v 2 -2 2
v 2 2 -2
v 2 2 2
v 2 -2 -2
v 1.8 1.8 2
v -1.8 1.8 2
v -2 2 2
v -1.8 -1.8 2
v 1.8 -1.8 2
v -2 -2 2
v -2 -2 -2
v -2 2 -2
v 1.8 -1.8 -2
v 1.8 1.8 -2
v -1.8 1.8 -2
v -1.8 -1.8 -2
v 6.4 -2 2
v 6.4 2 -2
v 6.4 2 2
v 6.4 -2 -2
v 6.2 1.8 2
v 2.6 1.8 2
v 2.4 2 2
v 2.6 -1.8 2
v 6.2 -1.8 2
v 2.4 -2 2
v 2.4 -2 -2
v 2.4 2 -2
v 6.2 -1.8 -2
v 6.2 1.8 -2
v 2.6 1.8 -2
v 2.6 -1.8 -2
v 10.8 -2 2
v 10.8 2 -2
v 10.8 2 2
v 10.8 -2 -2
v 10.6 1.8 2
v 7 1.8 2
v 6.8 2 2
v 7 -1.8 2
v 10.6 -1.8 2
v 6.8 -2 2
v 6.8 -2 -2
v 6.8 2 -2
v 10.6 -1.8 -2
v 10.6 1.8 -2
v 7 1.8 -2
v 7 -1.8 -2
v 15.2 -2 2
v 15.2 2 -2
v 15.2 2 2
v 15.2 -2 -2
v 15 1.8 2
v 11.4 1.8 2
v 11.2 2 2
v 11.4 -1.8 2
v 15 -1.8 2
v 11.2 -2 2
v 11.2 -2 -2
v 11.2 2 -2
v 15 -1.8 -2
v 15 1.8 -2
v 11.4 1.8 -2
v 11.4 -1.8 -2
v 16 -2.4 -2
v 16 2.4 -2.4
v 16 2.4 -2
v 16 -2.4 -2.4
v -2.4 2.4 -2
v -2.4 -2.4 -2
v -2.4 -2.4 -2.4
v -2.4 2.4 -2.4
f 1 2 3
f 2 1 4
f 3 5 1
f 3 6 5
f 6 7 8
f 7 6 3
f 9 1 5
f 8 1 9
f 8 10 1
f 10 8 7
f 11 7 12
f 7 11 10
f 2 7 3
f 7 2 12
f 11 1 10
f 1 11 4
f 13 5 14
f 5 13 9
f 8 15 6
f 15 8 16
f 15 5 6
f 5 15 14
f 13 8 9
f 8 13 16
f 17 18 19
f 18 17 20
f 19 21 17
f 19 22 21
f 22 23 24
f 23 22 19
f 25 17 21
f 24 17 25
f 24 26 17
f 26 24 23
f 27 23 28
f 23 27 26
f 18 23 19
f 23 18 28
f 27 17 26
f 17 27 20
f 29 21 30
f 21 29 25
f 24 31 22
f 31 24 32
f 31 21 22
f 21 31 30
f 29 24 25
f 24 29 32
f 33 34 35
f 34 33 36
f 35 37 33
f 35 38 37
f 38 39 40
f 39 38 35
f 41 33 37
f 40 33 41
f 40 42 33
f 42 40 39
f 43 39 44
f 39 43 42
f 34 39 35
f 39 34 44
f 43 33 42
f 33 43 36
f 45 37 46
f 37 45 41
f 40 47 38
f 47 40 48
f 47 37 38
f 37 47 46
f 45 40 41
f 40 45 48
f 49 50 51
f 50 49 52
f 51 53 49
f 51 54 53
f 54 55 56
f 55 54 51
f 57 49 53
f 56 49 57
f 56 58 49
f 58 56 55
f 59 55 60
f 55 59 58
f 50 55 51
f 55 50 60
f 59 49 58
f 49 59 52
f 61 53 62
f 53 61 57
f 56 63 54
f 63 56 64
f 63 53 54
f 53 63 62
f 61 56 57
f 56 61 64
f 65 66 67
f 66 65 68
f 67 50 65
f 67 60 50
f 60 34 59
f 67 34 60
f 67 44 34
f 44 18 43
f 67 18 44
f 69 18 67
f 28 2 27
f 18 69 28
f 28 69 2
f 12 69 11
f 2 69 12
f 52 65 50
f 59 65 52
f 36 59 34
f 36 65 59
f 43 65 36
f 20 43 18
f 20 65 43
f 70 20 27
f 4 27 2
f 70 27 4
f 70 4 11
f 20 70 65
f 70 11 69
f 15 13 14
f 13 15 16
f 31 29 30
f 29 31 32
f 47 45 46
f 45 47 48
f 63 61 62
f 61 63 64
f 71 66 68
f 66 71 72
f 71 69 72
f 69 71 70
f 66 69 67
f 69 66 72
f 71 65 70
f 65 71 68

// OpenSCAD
// file: boolean.scad
/*
	License: None
	This code is public domain

	Placed By: William A Adams
	31 Oct 2011
*/
// convenience for powers of 2 arithmetic
// Bits start counting from '0'
function bitval(pos) = pow(2,(pos)); 

// A quick check to see if a bit is set
// Does not work with negative numbers
function _BTEST(x, abit) = x % (abit+abit) >= abit; 
function BTEST(x, pos) = _BTEST(x, bitval(pos));

// Shift left by the specified number of positions
// Default is 1 postion.
// Equivalent to multiplying by 2
function LSHIFT(x, pos=1) = x*bitval(pos);

// Shift right by the specified number of positions
// Default is 1 position
// Equivalent to division by 2
function RSHIFT(x, pos=1) = floor(x/bitval(pos));

// Get the value of the lowest bit
// return as number '0' or '1'
function lowbit(x) = x-LSHIFT(RSHIFT(x));

// Get the value of a bit at a specific position
// return as number '0' or '1'
function BIT(x, pos=0) = lowbit(RSHIFT(x,pos));

// Invert the value of a bit
function BINV(a) = !a;

// Boolean Algebra
function BFALSE(a,b) = 0;
function BAND(a,b) = (a==1) && (b==1) ? 1 : 0;
function BA(a,b) = (a==1) ? 1 : 0;
function BB(a,b) = (b==1) ? 1 : 0;
function BXOR(a,b) = (a==b) ? 0 : 1;
function BOR(a,b) = (a==1) || (b==1) ? 1 : 0;
function BNOR(a,b) = (a==0) && (b==0);			// Peirce's arrow
function BXNOR(a,b) = a==b;
function BNOTB(a,b) = !b;
function BNOTA(a,b) = !a;
function BNAND(a, b) = (a==1) ? (b==1) ? 0 : 1 : 1;	// Sheffer stroke
function BTRUE(a,b) = 1;

// multi-bit operations
// a & b
function 32BITAND(a, b) = 
	LSHIFT(BAND(BIT(a,31), BIT(b,31)),31) +
	LSHIFT(BAND(BIT(a,30), BIT(b,30)),30) +
	LSHIFT(BAND(BIT(a,29), BIT(b,29)),29) +
	LSHIFT(BAND(BIT(a,28), BIT(b,28)),28) +
	LSHIFT(BAND(BIT(a,27), BIT(b,27)),27) +
	LSHIFT(BAND(BIT(a,26), BIT(b,26)),26) +
	LSHIFT(BAND(BIT(a,25), BIT(b,25)),25) +
	LSHIFT(BAND(BIT(a,24), BIT(b,24)),24)+
	LSHIFT(BAND(BIT(a,23), BIT(b,23)),23) +
	LSHIFT(BAND(BIT(a,22), BIT(b,22)),22) +
	LSHIFT(BAND(BIT(a,21), BIT(b,21)),21) +
	LSHIFT(BAND(BIT(a,20), BIT(b,20)),20) +
	LSHIFT(BAND(BIT(a,19), BIT(b,19)),19) +
	LSHIFT(BAND(BIT(a,18), BIT(b,18)),18) +
	LSHIFT(BAND(BIT(a,17), BIT(b,17)),17) +
	LSHIFT(BAND(BIT(a,16), BIT(b,16)),16)+
	LSHIFT(BAND(BIT(a,15), BIT(b,15)),15) +
	LSHIFT(BAND(BIT(a,14), BIT(b,14)),14) +
	LSHIFT(BAND(BIT(a,13), BIT(b,13)),13) +
	LSHIFT(BAND(BIT(a,12), BIT(b,12)),12) +
	LSHIFT(BAND(BIT(a,11), BIT(b,11)),11) +
	LSHIFT(BAND(BIT(a,10), BIT(b,10)),10) +
	LSHIFT(BAND(BIT(a,9), BIT(b,9)),9) +
	LSHIFT(BAND(BIT(a,8), BIT(b,8)),8)+
	LSHIFT(BAND(BIT(a,7), BIT(b,7)),7) +
	LSHIFT(BAND(BIT(a,6), BIT(b,6)),6) +
	LSHIFT(BAND(BIT(a,5), BIT(b,5)),5) +
	LSHIFT(BAND(BIT(a,4), BIT(b,4)),4) +
	LSHIFT(BAND(BIT(a,3), BIT(b,3)),3) +
	LSHIFT(BAND(BIT(a,2), BIT(b,2)),2) +
	LSHIFT(BAND(BIT(a,1), BIT(b,1)),1) +
	LSHIFT(BAND(BIT(a,0), BIT(b,0)),0);

// a & b
function 16BITAND(a, b) = 
	LSHIFT(BAND(BIT(a,15), BIT(b,15)),15) +
	LSHIFT(BAND(BIT(a,14), BIT(b,14)),14) +
	LSHIFT(BAND(BIT(a,13), BIT(b,13)),13) +
	LSHIFT(BAND(BIT(a,12), BIT(b,12)),12) +
	LSHIFT(BAND(BIT(a,11), BIT(b,11)),11) +
	LSHIFT(BAND(BIT(a,10), BIT(b,10)),10) +
	LSHIFT(BAND(BIT(a,9), BIT(b,9)),9) +
	LSHIFT(BAND(BIT(a,8), BIT(b,8)),8)+
	LSHIFT(BAND(BIT(a,7), BIT(b,7)),7) +
	LSHIFT(BAND(BIT(a,6), BIT(b,6)),6) +
	LSHIFT(BAND(BIT(a,5), BIT(b,5)),5) +
	LSHIFT(BAND(BIT(a,4), BIT(b,4)),4) +
	LSHIFT(BAND(BIT(a,3), BIT(b,3)),3) +
	LSHIFT(BAND(BIT(a,2), BIT(b,2)),2) +
	LSHIFT(BAND(BIT(a,1), BIT(b,1)),1) +
	LSHIFT(BAND(BIT(a,0), BIT(b,0)),0);

// a | b
function 32BITOR(a, b) = 
	LSHIFT(BOR(BIT(a,31), BIT(b,31)),31) +
	LSHIFT(BOR(BIT(a,30), BIT(b,30)),30) +
	LSHIFT(BOR(BIT(a,29), BIT(b,29)),29) +
	LSHIFT(BOR(BIT(a,28), BIT(b,28)),28) +
	LSHIFT(BOR(BIT(a,27), BIT(b,27)),27) +
	LSHIFT(BOR(BIT(a,26), BIT(b,26)),26) +
	LSHIFT(BOR(BIT(a,25), BIT(b,25)),25) +
	LSHIFT(BOR(BIT(a,24), BIT(b,24)),24)+
	LSHIFT(BOR(BIT(a,23), BIT(b,23)),23) +
	LSHIFT(BOR(BIT(a,22), BIT(b,22)),22) +
	LSHIFT(BOR(BIT(a,21), BIT(b,21)),21) +
	LSHIFT(BOR(BIT(a,20), BIT(b,20)),20) +
	LSHIFT(BOR(BIT(a,19), BIT(b,19)),19) +
	LSHIFT(BOR(BIT(a,18), BIT(b,18)),18) +
	LSHIFT(BOR(BIT(a,17), BIT(b,17)),17) +
	LSHIFT(BOR(BIT(a,16), BIT(b,16)),16)+
	LSHIFT(BOR(BIT(a,15), BIT(b,15)),15) +
	LSHIFT(BOR(BIT(a,14), BIT(b,14)),14) +
	LSHIFT(BOR(BIT(a,13), BIT(b,13)),13) +
	LSHIFT(BOR(BIT(a,12), BIT(b,12)),12) +
	LSHIFT(BOR(BIT(a,11), BIT(b,11)),11) +
	LSHIFT(BOR(BIT(a,10), BIT(b,10)),10) +
	LSHIFT(BOR(BIT(a,9), BIT(b,9)),9) +
	LSHIFT(BOR(BIT(a,8), BIT(b,8)),8)+
	LSHIFT(BOR(BIT(a,7), BIT(b,7)),7) +
	LSHIFT(BOR(BIT(a,6), BIT(b,6)),6) +
	LSHIFT(BOR(BIT(a,5), BIT(b,5)),5) +
	LSHIFT(BOR(BIT(a,4), BIT(b,4)),4) +
	LSHIFT(BOR(BIT(a,3), BIT(b,3)),3) +
	LSHIFT(BOR(BIT(a,2), BIT(b,2)),2) +
	LSHIFT(BOR(BIT(a,1), BIT(b,1)),1) +
	LSHIFT(BOR(BIT(a,0), BIT(b,0)),0);

// ~a
function 32BITNOT(a) = 
	LSHIFT(BINV(BIT(a,31)), 31) +
	LSHIFT(BINV(BIT(a,30)), 30) +
	LSHIFT(BINV(BIT(a,29)), 29) +
	LSHIFT(BINV(BIT(a,28)), 28) +
	LSHIFT(BINV(BIT(a,27)), 27) +
	LSHIFT(BINV(BIT(a,26)), 26) +
	LSHIFT(BINV(BIT(a,25)), 25) +
	LSHIFT(BINV(BIT(a,24)), 24) +
	LSHIFT(BINV(BIT(a,23)), 23) +
	LSHIFT(BINV(BIT(a,22)), 22) +
	LSHIFT(BINV(BIT(a,21)), 21) +
	LSHIFT(BINV(BIT(a,20)), 20) +
	LSHIFT(BINV(BIT(a,19)), 19) +
	LSHIFT(BINV(BIT(a,18)), 18) +
	LSHIFT(BINV(BIT(a,17)), 17) +
	LSHIFT(BINV(BIT(a,16)), 16) +
	LSHIFT(BINV(BIT(a,15)), 15) +
	LSHIFT(BINV(BIT(a,14)), 14) +
	LSHIFT(BINV(BIT(a,13)), 13) +
	LSHIFT(BINV(BIT(a,12)), 12) +
	LSHIFT(BINV(BIT(a,11)), 11) +
	LSHIFT(BINV(BIT(a,10)), 10) +
	LSHIFT(BINV(BIT(a,9)), 9) +
	LSHIFT(BINV(BIT(a,8)), 8) +
	LSHIFT(BINV(BIT(a,7)), 7) +
	LSHIFT(BINV(BIT(a,6)), 6) +
	LSHIFT(BINV(BIT(a,5)), 5) +
	LSHIFT(BINV(BIT(a,4)), 4) +
	LSHIFT(BINV(BIT(a,3)), 3) +
	LSHIFT(BINV(BIT(a,2)), 2) +
	LSHIFT(BINV(BIT(a,1)), 1) +
	LSHIFT(BINV(BIT(a,0)), 0) ;

// a ^ b
function 32BITXOR(a, b) = 
	LSHIFT(BXOR(BIT(a,31), BIT(b,31)),31) +
	LSHIFT(BXOR(BIT(a,30), BIT(b,30)),30) +
	LSHIFT(BXOR(BIT(a,29), BIT(b,29)),29) +
	LSHIFT(BXOR(BIT(a,28), BIT(b,28)),28) +
	LSHIFT(BXOR(BIT(a,27), BIT(b,27)),27) +
	LSHIFT(BXOR(BIT(a,26), BIT(b,26)),26) +
	LSHIFT(BXOR(BIT(a,25), BIT(b,25)),25) +
	LSHIFT(BXOR(BIT(a,24), BIT(b,24)),24)+
	LSHIFT(BXOR(BIT(a,23), BIT(b,23)),23) +
	LSHIFT(BXOR(BIT(a,22), BIT(b,22)),22) +
	LSHIFT(BXOR(BIT(a,21), BIT(b,21)),21) +
	LSHIFT(BXOR(BIT(a,20), BIT(b,20)),20) +
	LSHIFT(BXOR(BIT(a,19), BIT(b,19)),19) +
	LSHIFT(BXOR(BIT(a,18), BIT(b,18)),18) +
	LSHIFT(BXOR(BIT(a,17), BIT(b,17)),17) +
	LSHIFT(BXOR(BIT(a,16), BIT(b,16)),16)+
	LSHIFT(BXOR(BIT(a,15), BIT(b,15)),15) +
	LSHIFT(BXOR(BIT(a,14), BIT(b,14)),14) +
	LSHIFT(BXOR(BIT(a,13), BIT(b,13)),13) +
	LSHIFT(BXOR(BIT(a,12), BIT(b,12)),12) +
	LSHIFT(BXOR(BIT(a,11), BIT(b,11)),11) +
	LSHIFT(BXOR(BIT(a,10), BIT(b,10)),10) +
	LSHIFT(BXOR(BIT(a,9), BIT(b,9)),9) +
	LSHIFT(BXOR(BIT(a,8), BIT(b,8)),8)+
	LSHIFT(BXOR(BIT(a,7), BIT(b,7)),7) +
	LSHIFT(BXOR(BIT(a,6), BIT(b,6)),6) +
	LSHIFT(BXOR(BIT(a,5), BIT(b,5)),5) +
	LSHIFT(BXOR(BIT(a,4), BIT(b,4)),4) +
	LSHIFT(BXOR(BIT(a,3), BIT(b,3)),3) +
	LSHIFT(BXOR(BIT(a,2), BIT(b,2)),2) +
	LSHIFT(BXOR(BIT(a,1), BIT(b,1)),1) +
	LSHIFT(BXOR(BIT(a,0), BIT(b,0)),0);
// main file
/* 
License: None
This code is public domain

Placed By: William A Adams
31 Oct 2011
*/

include <boolean.scad>

joinfactor = 0.00001;

//display_1_8();

scale([4,4,4])
display_binary(number=0, bits=4, withplate=true);
//display_binary(number=1, bits=4, withplate=true);
//display_binary(number=2, bits=4, withplate=true);
//display_binary(number=4, bits=4, withplate=true);
//display_binary(number=5, bits=4, withplate=true);

//scale([4,4,8])
//display_binary(number = 1964, bits = 12, withplate=true);

//display_binary(number = 198, bits = 12, withplate=true);
//test_lowbit();
//test_BIT();

module display_1_8()
{
	scale([8,8,8])
	{
		for (number = [0:8])
		{
			translate([0, 1.2*number, 0])
			display_binary(number = number, bits = 4, withplate=true);
		
		}
	}
}

module display_binary(number, bits)
{
	side = 1;
	gap = 0.1;

	for (pos = [0:bits-1])
	{
		if (BTEST(number, bits-1-pos))
		{
			translate([pos*(side+gap), 0, 0])
			cube(size=[side, side, side], center=true);
		} else
		{
			translate([pos*(side+gap), 0, 0])
			{
				difference()
				{
					cube(size=[side, side, side], center=true);
					
					cube(size=[side-gap, side-gap,side+gap], center=true);
//					cube(size=[side-gap, side-gap,side-gap], center=true);
				}
			}
		}
	}

	if (withplate)
	{
		translate([-side/2-gap, -side/2-gap, -gap-(side/2)+joinfactor])
		cube(size = [(side+gap)*bits+gap*2, (side+gap*2), gap]);
	}
}

module test_lowbit()
{
	echo(lowbit(3));
	echo(lowbit(2));
	echo(lowbit(5));

	echo(lowbit(5));

	echo(lowbit(RSHIFT(5)));

	echo(lowbit(RSHIFT(RSHIFT(5))));
}

module test_BIT()
{
	echo(BIT(5,0));
	echo(BIT(5,1));
	echo(BIT(5,2));
	
	echo(BTEST(5,0));
	echo(BTEST(5,1));
	echo(BTEST(5,2));
	
	
	echo("8: ", BIT(8,3), BIT(8,2), BIT(8,1), BIT(8,0));
	echo("7: ", BIT(7,3), BIT(7,2), BIT(7,1), BIT(7,0));
}

module test_algebra()
{
// Truth tables
//echo("AND  ", BAND(0,0), BAND(0,1), BAND(1,0), BAND(1,1));
//echo("XOR  ", BXOR(0,0), BXOR(0,1), BXOR(1,0), BXOR(1,1));
//echo("OR  ", BOR(0,0), BOR(0,1), BOR(1,0), BOR(1,1));
//echo("NOR  ", BNOR(0,0), BNOR(0,1), BNOR(1,0), BNOR(1,1));
//echo("XNOR  ", BXNOR(0,0), BXNOR(0,1), BXNOR(1,0), BXNOR(1,1));
//echo("NAND ", BNAND(0,0),BNAND(0,1),BNAND(1,0),BNAND(1,1));


//echo("32BITAND (3,6):  ", 32BITAND(3,6));
//echo("32BITAND (1,0):  ", 32BITAND(1,0));
//echo("32BITAND (7,5):  ", 32BITAND(7,5));

//
//echo("BITS (3): ", BIT(3,3), BIT(3,2), BIT(3,1), BIT(3,0));
//echo("BITS (6): ", BIT(6,3), BIT(6,2), BIT(6,1), BIT(6,0));

//echo(LSHIFT(BAND(BIT(3,3), BIT(6,3)),3));

//echo("pow 2, 0 ");
//
//cube();
}
